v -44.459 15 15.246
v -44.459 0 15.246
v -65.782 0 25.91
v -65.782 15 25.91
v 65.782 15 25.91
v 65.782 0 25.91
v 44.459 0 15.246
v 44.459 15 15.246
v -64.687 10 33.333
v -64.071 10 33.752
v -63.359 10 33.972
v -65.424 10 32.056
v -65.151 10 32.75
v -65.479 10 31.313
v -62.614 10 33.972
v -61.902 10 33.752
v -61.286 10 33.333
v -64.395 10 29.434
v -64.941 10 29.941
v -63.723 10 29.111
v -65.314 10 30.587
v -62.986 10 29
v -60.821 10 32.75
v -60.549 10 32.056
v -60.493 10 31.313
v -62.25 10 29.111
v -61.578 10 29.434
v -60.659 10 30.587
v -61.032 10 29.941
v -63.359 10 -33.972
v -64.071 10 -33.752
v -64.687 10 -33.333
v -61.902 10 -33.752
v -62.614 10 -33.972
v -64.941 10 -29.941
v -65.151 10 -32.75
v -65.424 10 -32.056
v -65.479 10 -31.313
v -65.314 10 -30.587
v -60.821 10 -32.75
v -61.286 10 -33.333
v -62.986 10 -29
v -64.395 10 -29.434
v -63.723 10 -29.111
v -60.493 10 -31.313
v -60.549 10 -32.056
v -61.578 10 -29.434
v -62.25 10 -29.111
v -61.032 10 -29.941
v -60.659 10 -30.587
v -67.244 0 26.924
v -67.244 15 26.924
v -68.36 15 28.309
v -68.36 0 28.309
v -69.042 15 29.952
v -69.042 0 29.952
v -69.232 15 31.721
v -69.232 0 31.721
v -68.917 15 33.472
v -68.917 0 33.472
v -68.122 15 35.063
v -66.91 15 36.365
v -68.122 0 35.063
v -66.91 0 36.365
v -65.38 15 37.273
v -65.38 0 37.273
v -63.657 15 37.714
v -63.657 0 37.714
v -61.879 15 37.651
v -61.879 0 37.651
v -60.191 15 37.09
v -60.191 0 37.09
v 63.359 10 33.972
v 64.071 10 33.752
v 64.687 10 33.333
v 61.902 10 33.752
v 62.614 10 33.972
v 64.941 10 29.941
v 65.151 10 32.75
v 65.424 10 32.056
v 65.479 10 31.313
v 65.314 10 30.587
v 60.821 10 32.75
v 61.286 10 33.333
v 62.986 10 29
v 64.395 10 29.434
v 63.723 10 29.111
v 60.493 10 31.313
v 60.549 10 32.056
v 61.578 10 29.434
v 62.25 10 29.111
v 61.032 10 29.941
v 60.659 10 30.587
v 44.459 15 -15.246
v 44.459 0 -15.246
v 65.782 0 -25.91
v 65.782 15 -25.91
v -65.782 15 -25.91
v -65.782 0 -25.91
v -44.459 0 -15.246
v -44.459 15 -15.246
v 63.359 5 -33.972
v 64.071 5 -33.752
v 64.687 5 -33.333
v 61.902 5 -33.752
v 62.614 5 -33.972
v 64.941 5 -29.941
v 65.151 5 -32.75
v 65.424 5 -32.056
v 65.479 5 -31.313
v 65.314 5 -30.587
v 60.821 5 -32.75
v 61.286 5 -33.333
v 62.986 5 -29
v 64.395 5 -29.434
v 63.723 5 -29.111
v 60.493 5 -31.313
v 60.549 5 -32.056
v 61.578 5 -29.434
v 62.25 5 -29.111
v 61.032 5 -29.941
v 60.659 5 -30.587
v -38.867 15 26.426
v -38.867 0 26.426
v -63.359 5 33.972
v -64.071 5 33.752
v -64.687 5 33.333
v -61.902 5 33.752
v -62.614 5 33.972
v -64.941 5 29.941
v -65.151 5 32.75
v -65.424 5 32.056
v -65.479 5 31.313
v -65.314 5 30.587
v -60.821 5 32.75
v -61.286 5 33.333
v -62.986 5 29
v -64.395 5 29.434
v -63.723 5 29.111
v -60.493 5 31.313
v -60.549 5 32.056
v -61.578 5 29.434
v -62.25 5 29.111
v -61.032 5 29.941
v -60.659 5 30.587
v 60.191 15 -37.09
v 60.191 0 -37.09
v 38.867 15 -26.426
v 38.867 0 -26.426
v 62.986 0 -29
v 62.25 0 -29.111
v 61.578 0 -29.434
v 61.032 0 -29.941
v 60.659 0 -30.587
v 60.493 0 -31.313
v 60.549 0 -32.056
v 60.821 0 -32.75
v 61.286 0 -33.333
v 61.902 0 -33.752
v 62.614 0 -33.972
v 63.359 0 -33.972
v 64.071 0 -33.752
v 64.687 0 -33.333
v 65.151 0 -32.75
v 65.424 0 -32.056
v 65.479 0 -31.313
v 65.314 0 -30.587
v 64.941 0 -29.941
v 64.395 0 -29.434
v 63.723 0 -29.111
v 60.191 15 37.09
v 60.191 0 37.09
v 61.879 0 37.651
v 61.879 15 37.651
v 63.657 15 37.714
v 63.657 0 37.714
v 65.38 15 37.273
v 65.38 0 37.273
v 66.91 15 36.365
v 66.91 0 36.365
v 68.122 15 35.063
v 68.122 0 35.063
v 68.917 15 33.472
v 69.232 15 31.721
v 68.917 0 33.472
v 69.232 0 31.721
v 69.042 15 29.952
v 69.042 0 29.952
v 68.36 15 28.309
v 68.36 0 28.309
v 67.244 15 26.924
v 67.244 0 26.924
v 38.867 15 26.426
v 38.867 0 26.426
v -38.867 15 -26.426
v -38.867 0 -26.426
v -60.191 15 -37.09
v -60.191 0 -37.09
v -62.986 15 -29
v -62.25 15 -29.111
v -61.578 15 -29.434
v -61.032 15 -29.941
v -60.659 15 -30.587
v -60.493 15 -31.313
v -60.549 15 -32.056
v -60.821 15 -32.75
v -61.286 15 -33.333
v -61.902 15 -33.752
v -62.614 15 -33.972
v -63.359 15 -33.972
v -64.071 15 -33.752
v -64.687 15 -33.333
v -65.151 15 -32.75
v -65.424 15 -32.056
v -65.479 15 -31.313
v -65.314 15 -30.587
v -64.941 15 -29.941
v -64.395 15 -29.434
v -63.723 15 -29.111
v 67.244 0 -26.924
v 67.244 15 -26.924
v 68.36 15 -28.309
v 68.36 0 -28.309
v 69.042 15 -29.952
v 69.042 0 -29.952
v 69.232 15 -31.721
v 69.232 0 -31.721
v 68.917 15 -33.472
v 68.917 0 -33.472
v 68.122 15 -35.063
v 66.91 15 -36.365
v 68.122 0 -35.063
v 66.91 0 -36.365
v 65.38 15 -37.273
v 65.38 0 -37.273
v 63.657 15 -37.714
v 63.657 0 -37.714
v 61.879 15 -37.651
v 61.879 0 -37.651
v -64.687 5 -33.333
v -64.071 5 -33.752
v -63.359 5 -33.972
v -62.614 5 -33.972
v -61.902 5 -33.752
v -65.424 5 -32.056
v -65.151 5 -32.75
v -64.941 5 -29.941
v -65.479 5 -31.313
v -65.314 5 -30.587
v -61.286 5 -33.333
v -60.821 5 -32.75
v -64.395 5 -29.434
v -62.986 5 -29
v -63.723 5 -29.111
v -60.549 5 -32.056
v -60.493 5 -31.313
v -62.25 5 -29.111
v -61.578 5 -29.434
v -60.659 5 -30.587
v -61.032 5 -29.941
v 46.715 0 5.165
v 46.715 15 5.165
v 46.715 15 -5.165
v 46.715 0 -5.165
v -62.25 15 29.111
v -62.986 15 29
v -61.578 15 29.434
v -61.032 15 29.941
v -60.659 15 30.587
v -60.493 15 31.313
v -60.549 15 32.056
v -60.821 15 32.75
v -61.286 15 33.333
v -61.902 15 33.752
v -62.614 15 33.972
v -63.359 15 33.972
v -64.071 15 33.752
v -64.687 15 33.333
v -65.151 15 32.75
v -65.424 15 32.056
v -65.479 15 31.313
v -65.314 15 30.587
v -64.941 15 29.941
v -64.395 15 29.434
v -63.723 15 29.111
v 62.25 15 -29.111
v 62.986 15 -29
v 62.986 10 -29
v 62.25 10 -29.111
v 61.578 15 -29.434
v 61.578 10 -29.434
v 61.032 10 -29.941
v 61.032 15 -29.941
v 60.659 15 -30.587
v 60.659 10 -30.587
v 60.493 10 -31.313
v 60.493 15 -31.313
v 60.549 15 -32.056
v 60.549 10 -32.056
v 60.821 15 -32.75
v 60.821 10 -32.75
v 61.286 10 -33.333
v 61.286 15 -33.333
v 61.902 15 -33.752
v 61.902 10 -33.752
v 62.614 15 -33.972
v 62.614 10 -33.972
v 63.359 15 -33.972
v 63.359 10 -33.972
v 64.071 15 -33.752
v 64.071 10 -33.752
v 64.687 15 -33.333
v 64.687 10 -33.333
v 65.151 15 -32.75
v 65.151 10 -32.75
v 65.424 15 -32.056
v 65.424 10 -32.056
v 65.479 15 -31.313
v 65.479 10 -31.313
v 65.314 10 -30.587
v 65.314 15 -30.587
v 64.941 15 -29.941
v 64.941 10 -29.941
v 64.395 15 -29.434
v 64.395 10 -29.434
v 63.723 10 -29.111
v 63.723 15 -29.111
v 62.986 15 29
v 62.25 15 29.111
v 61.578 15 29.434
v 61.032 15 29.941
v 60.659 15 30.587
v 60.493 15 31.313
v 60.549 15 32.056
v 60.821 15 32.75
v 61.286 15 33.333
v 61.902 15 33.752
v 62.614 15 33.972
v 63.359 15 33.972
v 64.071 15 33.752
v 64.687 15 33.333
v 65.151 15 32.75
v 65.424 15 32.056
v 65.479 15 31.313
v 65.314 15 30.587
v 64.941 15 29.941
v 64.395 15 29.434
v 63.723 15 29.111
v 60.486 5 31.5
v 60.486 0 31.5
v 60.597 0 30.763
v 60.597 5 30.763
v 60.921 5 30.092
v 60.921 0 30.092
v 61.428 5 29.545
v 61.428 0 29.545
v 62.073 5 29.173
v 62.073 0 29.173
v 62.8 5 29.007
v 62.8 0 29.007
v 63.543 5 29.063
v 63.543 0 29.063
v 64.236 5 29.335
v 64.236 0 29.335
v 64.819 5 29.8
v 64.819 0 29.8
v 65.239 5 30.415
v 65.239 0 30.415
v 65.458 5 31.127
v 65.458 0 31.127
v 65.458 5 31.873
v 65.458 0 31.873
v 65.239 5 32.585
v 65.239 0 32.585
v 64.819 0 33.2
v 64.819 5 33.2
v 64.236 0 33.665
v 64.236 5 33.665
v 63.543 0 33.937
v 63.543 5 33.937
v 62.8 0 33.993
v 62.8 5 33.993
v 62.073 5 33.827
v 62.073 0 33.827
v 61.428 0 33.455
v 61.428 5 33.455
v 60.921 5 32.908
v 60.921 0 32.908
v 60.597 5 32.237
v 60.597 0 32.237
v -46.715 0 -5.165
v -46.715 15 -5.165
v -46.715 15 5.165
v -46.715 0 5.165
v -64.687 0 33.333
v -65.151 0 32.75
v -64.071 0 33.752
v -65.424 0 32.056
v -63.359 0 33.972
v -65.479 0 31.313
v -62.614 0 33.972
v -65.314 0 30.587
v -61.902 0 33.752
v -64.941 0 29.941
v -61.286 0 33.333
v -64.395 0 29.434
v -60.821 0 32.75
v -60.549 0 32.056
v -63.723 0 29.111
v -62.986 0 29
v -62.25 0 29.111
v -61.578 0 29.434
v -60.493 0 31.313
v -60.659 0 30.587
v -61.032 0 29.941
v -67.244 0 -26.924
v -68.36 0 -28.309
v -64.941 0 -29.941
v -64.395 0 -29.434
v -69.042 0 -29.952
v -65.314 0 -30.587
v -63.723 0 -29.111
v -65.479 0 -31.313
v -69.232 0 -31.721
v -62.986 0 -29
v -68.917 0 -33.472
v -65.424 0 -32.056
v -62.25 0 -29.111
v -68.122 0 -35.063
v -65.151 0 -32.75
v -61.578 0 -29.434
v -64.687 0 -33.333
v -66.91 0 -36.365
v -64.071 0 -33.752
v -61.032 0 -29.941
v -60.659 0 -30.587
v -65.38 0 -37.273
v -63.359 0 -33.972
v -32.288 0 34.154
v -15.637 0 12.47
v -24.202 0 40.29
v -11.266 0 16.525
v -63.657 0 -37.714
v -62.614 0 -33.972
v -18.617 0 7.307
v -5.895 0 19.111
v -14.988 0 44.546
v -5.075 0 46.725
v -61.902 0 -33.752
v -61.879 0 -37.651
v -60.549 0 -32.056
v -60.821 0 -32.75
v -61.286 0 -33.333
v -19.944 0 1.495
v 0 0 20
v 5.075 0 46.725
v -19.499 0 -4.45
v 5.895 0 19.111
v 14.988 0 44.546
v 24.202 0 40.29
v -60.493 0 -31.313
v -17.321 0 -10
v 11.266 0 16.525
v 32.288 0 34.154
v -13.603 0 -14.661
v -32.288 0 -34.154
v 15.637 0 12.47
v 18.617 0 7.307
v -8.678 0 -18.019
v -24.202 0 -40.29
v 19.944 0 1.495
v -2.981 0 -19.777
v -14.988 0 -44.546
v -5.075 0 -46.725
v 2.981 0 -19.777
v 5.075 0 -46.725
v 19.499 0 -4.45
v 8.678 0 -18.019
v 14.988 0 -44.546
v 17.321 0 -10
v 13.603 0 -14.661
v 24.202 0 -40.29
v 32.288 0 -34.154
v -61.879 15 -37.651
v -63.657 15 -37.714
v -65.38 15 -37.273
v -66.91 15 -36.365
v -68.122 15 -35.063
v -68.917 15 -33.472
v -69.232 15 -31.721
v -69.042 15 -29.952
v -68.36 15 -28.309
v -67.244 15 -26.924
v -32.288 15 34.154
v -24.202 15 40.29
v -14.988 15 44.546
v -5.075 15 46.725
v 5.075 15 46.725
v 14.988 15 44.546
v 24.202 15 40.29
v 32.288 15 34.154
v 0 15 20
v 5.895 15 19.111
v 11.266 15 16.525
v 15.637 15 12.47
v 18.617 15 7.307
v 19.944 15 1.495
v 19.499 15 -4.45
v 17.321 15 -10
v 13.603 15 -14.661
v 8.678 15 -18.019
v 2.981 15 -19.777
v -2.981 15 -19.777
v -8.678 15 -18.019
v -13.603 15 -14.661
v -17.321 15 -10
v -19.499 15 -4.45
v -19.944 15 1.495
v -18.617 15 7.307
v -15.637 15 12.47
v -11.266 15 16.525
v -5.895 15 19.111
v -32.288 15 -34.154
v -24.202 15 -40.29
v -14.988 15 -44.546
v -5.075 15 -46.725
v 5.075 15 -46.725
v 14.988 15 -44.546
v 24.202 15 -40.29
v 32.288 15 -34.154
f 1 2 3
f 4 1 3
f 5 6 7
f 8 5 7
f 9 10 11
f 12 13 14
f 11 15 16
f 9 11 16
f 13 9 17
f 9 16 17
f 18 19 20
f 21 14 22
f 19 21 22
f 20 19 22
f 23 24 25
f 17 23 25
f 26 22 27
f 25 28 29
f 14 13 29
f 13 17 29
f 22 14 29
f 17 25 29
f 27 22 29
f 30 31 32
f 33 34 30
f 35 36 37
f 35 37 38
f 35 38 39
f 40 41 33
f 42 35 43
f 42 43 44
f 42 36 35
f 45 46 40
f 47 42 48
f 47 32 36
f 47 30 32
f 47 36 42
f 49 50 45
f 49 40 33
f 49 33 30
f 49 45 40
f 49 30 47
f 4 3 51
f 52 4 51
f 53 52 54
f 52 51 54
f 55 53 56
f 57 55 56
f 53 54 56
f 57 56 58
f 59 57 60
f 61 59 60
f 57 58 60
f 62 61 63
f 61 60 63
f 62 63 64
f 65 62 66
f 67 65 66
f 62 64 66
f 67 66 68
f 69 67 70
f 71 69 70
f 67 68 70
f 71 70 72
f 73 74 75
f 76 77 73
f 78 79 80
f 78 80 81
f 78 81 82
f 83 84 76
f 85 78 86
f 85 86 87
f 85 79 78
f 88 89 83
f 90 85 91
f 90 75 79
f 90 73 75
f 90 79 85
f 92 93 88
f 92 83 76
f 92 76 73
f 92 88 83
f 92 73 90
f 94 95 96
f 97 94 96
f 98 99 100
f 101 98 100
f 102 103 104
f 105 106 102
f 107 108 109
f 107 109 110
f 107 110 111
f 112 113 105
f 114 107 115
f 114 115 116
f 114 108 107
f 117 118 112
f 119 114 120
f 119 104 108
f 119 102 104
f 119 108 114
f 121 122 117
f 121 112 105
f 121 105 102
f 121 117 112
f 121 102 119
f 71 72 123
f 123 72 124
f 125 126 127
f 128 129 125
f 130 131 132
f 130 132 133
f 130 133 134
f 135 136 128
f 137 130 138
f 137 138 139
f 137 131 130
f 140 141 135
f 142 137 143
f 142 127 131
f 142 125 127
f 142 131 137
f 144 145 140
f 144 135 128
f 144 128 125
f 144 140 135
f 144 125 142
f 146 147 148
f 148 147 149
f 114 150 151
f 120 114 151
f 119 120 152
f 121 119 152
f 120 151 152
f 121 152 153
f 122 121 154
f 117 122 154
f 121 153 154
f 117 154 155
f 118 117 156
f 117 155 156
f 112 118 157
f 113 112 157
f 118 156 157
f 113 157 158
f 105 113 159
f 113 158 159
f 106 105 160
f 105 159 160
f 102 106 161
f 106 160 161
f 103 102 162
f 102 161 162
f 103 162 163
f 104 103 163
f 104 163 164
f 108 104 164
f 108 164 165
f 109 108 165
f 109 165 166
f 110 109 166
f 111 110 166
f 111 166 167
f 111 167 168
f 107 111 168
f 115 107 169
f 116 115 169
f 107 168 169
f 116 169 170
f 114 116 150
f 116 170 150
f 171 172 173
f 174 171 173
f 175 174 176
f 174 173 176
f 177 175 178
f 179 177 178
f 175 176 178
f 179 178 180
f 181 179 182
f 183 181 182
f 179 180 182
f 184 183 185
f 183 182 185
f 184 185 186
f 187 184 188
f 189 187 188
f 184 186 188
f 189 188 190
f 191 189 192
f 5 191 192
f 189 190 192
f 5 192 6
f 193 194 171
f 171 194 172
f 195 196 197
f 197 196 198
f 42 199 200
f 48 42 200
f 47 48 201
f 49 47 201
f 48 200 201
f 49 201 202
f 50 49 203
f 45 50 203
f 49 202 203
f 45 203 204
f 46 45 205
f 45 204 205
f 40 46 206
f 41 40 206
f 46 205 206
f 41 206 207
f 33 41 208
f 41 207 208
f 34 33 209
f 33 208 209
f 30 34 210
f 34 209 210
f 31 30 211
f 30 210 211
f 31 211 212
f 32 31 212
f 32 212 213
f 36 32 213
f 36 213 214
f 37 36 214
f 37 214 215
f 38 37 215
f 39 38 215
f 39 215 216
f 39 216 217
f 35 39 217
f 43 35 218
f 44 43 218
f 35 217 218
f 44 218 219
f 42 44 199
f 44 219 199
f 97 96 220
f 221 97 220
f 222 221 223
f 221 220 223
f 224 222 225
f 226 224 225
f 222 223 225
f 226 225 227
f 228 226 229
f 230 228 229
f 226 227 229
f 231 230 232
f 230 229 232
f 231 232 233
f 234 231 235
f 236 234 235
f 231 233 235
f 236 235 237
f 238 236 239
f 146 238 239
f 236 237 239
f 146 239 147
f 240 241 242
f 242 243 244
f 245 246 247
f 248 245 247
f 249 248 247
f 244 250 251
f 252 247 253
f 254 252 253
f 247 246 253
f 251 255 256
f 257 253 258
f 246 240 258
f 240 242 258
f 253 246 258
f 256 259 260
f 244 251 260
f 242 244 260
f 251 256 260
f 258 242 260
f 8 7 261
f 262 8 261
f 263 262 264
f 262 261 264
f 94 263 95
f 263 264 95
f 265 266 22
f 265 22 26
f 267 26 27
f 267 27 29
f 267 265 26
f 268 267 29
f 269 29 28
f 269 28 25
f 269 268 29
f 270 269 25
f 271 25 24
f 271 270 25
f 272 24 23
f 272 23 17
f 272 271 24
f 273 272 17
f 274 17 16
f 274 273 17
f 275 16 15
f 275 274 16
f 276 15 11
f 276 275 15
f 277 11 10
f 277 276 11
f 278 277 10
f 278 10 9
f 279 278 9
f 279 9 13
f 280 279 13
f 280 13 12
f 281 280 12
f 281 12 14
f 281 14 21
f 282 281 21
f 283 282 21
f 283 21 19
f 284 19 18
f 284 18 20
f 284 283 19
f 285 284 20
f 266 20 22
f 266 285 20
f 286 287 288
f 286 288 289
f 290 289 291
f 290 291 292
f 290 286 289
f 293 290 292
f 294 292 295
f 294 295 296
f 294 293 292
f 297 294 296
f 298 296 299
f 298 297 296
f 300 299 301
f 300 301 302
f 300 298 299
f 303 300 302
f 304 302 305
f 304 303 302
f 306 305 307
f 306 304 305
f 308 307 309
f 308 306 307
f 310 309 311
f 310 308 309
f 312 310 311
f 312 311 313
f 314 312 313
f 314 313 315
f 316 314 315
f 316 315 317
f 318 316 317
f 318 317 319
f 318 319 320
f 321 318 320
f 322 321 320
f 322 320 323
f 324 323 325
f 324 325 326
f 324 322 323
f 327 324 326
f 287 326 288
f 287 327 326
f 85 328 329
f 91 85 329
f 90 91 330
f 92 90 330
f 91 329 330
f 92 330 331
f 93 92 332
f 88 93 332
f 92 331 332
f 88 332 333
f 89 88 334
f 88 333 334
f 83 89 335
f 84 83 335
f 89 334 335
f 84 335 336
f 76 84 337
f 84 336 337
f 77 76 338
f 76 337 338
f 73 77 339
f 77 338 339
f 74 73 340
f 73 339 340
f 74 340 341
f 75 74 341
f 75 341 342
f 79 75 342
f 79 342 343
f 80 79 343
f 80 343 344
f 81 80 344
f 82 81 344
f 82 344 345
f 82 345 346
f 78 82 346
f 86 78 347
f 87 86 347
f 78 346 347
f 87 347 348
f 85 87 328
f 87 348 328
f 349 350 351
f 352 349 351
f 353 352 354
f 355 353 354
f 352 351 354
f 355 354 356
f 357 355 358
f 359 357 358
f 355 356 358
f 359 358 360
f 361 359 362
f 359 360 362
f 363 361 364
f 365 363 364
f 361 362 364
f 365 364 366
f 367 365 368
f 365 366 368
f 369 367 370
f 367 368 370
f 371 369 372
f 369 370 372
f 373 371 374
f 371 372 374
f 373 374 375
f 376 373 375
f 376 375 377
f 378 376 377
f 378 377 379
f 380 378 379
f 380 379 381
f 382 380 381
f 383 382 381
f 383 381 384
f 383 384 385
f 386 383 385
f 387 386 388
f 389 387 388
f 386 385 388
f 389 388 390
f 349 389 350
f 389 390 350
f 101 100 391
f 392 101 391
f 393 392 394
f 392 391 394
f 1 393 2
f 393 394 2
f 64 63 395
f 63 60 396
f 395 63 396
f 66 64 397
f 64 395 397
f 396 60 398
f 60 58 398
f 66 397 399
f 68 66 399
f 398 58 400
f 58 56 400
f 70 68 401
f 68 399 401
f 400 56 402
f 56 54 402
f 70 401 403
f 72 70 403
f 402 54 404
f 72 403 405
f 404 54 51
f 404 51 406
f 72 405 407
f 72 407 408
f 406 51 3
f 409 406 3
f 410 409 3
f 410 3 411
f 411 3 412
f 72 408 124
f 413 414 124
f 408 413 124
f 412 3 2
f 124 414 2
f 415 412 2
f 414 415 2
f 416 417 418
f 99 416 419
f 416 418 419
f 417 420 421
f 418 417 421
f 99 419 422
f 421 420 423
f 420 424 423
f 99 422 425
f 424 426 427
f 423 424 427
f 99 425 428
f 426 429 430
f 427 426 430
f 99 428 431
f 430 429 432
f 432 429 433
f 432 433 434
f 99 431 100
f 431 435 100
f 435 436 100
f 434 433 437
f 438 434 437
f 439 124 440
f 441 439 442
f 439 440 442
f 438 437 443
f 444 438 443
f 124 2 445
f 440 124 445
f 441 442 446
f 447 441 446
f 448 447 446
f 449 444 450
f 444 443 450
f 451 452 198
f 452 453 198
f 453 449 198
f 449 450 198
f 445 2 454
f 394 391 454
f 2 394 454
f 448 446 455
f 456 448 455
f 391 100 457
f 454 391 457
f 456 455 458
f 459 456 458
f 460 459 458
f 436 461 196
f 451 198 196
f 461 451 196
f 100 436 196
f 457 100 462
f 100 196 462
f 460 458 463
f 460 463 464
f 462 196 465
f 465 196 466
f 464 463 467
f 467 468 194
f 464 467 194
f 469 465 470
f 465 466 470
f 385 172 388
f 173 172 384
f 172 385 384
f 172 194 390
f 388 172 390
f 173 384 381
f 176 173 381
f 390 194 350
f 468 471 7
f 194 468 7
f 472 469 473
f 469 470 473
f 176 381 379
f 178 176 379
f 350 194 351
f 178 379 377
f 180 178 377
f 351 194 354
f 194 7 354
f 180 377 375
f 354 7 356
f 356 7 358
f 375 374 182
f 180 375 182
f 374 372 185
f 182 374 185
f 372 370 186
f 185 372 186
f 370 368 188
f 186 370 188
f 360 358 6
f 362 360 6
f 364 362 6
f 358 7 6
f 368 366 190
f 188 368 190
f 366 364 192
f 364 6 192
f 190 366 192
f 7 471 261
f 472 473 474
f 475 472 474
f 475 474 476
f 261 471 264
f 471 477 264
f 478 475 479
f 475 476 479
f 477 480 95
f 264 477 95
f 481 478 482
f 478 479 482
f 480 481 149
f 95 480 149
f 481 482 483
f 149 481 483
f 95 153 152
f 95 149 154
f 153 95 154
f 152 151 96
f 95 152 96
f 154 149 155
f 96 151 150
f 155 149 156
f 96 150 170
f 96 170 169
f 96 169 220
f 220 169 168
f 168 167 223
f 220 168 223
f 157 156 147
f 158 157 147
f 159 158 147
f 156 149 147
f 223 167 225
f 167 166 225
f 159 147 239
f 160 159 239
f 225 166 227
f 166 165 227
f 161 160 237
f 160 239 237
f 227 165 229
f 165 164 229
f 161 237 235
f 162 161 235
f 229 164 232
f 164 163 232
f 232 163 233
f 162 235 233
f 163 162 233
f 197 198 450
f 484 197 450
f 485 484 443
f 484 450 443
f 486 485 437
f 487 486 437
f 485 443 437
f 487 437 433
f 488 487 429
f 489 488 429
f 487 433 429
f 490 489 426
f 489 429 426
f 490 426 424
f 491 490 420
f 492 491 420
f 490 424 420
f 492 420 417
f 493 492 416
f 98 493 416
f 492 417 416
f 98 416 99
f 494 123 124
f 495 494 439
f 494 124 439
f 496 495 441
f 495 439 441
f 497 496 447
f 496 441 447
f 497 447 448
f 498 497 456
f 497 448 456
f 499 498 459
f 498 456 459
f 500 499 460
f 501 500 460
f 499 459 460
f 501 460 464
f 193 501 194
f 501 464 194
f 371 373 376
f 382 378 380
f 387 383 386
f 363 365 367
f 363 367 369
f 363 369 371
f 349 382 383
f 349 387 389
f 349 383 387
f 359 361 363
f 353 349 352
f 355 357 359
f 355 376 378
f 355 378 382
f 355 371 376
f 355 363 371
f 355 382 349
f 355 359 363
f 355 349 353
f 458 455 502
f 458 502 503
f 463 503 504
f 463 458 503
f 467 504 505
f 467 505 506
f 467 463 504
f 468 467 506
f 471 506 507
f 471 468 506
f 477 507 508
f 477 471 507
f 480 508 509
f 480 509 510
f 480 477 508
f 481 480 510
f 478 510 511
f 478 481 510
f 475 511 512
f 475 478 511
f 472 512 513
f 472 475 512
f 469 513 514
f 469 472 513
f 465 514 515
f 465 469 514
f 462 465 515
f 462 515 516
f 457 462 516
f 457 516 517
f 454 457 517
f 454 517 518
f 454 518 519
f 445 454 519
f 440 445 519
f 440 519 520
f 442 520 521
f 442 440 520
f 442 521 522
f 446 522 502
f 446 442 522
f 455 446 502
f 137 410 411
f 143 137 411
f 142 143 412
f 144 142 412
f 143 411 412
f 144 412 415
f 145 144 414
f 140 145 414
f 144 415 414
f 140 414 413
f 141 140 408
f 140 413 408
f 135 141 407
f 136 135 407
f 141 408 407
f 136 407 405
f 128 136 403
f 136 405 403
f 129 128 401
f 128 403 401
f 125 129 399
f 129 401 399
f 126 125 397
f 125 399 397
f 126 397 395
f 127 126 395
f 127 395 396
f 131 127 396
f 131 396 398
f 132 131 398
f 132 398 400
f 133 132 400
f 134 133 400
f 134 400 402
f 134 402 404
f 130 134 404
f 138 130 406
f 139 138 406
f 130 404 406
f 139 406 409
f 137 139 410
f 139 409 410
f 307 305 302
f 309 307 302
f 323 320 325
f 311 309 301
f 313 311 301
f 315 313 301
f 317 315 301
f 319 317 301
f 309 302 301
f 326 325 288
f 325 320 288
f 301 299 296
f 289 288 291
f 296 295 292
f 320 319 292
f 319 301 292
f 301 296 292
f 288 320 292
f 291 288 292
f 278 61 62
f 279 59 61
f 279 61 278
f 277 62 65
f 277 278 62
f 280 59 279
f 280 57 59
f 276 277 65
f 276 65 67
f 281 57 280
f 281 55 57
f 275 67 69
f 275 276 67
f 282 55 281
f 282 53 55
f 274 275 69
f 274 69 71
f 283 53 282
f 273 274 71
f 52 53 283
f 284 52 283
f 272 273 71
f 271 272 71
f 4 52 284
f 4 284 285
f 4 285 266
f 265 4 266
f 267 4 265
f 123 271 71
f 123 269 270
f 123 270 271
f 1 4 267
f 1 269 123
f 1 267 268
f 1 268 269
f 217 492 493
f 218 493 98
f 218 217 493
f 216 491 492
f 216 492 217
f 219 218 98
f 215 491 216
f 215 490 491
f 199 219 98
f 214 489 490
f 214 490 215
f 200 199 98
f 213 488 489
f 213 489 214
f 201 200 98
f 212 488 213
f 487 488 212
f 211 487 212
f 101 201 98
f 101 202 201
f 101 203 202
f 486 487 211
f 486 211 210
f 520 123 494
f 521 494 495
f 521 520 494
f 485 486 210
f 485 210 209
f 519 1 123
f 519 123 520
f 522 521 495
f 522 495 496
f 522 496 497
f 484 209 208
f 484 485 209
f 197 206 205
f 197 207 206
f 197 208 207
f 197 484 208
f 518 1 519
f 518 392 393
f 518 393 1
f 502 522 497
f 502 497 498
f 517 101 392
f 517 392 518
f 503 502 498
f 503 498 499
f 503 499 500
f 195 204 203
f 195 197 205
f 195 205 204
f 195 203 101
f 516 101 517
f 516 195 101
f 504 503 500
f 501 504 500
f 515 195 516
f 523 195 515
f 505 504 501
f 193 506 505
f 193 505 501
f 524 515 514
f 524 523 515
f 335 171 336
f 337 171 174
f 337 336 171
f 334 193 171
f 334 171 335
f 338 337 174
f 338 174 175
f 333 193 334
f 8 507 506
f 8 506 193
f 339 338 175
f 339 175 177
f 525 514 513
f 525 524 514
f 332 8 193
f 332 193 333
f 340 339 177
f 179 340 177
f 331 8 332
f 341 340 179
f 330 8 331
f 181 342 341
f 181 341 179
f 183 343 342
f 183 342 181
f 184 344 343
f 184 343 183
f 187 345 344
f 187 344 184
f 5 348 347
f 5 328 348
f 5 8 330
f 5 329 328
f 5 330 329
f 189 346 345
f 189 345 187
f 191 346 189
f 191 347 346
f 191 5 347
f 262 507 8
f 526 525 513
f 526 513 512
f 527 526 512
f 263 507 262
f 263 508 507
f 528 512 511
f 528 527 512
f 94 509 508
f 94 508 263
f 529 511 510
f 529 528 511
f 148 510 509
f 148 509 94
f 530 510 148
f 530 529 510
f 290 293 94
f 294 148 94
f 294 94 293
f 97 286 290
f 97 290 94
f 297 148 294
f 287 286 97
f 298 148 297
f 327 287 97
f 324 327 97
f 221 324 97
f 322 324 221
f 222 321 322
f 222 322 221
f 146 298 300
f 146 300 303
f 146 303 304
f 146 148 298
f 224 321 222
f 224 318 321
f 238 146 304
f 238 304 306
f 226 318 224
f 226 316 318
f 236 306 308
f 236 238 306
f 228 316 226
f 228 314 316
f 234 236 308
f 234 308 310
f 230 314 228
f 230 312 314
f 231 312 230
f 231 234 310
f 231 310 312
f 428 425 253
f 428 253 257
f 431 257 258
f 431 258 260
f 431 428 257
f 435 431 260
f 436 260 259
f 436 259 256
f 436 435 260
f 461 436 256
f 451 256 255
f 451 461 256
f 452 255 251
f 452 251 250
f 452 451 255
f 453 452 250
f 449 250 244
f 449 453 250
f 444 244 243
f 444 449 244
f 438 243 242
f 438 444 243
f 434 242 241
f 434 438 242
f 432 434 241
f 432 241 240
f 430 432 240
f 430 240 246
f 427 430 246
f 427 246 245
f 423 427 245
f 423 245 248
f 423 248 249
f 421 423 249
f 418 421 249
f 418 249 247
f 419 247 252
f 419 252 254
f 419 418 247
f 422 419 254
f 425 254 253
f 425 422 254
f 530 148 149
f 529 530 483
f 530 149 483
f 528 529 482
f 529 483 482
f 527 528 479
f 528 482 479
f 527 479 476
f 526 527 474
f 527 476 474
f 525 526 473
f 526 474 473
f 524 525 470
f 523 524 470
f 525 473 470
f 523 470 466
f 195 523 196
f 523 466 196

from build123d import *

# Parameters (mm, degrees)
SKETCH_1_R               = 20
EXTRUDE_1_DEPTH          = 15
SKETCH_2_R               = 2.5
CUT_EXTRUDE_1_DEPTH      = 5
MIRROR_2_COPY_1_SKETCH_R = 2.5
MIRROR_2_COPY_1_DEPTH    = 5
MIRROR_3_COPY_1_SKETCH_R = 2.5
MIRROR_3_COPY_1_DEPTH    = 5
MIRROR_3_COPY_2_SKETCH_R = 2.5
MIRROR_3_COPY_2_DEPTH    = 5
MIRROR_3_COPY_3_SKETCH_R = 2.5
MIRROR_3_COPY_3_DEPTH    = 5


with BuildPart() as part:
    # 草图1 → 凸台-拉伸1 (new body)
    with BuildSketch(Plane(origin=(0, 0, 0), x_dir=(1, 0, 0), z_dir=(0, 1, 0))):
        with BuildLine():
            Line((44.458501576, 15.246036783), (65.781966365, 25.910071498))
            ThreePointArc((65.781966365, 25.910071498), (68.576327064, 34.295567803), (60.190830759, 37.089928502))
            Line((60.190830759, 37.089928502), (38.867365971, 26.425893787))
            ThreePointArc((38.867365971, 26.425893787), (0, 47), (-38.867365971, 26.425893787))
            Line((-38.867365971, 26.425893787), (-60.190830759, 37.089928502))
            ThreePointArc((-60.190830759, 37.089928502), (-68.576327064, 34.295567803), (-65.781966365, 25.910071498))
            Line((-65.781966365, 25.910071498), (-44.458501576, 15.246036783))
            ThreePointArc((-44.458501576, 15.246036783), (-47, 0), (-44.458501576, -15.246036783))
            Line((-44.458501576, -15.246036783), (-65.781966365, -25.910071498))
            ThreePointArc((-65.781966365, -25.910071498), (-68.576327064, -34.295567803), (-60.190830759, -37.089928502))
            Line((-60.190830759, -37.089928502), (-38.867365971, -26.425893787))
            ThreePointArc((-38.867365971, -26.425893787), (0, -47), (38.867365971, -26.425893787))
            Line((38.867365971, -26.425893787), (60.190830759, -37.089928502))
            ThreePointArc((60.190830759, -37.089928502), (68.576327064, -34.295567803), (65.781966365, -25.910071498))
            Line((65.781966365, -25.910071498), (44.458501576, -15.246036783))
            ThreePointArc((44.458501576, -15.246036783), (47, 0), (44.458501576, 15.246036783))
        make_face()
        with Locations(Location((0, 0, 0), (0, 0, 270))):
            Circle(SKETCH_1_R, mode=Mode.SUBTRACT)
    extrude(amount=EXTRUDE_1_DEPTH)

    # 草图2 → 切除-拉伸1 (cut)
    with BuildSketch(Plane(origin=(0, 15, 0), x_dir=(1, 0, 0), z_dir=(0, 1, 0))):
        with Locations(Location((-62.986398562, 31.5, 0), (0, 0, 270))):
            Circle(SKETCH_2_R)
    cut_extrude_1 = extrude(amount=-CUT_EXTRUDE_1_DEPTH, mode=Mode.SUBTRACT)

    # 镜向1: 切除-拉伸1 across plane
    add(cut_extrude_1.mirror(Plane.XY), mode=Mode.SUBTRACT)

    # 镜向2: 切除-拉伸1 across plane
    add(cut_extrude_1.mirror(Plane(origin=(0, 0, 0), x_dir=(0, 0, 1), z_dir=(1, 0, 0))), mode=Mode.SUBTRACT)

    # 镜向2 copy 1 sketch → 镜向2 copy 1 (cut)
    with BuildSketch(Plane(origin=(0, 15, 0), x_dir=(-1, 0, 0), z_dir=(0, 1, 0))):
        with Locations(Location((-62.986398562, 31.5, 0), (0, 0, 270))):
            Circle(MIRROR_2_COPY_1_SKETCH_R)
    extrude(amount=-MIRROR_2_COPY_1_DEPTH, mode=Mode.SUBTRACT)

    # 镜向3: 切除-拉伸1 across plane
    add(cut_extrude_1.mirror(Plane(origin=(0, 7.5, 0), x_dir=(0, 0, 1), z_dir=(0, -1, 0))), mode=Mode.SUBTRACT)

    # 镜向3 copy 1 sketch → 镜向3 copy 1 (cut)
    with BuildSketch(Plane.XZ):
        with Locations(Location((-62.986398562, 31.5, 0), (0, 0, 270))):
            Circle(MIRROR_3_COPY_1_SKETCH_R)
    extrude(amount=-MIRROR_3_COPY_1_DEPTH, mode=Mode.SUBTRACT)

    # 镜向3 copy 2 sketch → 镜向3 copy 2 (cut)
    with BuildSketch(Plane(origin=(0, 0, 0), x_dir=(-1, 0, 0), z_dir=(0, -1, 0))):
        with Locations(Location((-62.986398562, 31.5, 0), (0, 0, 270))):
            Circle(MIRROR_3_COPY_2_SKETCH_R)
    extrude(amount=-MIRROR_3_COPY_2_DEPTH, mode=Mode.SUBTRACT)

    # 镜向3 copy 3 sketch → 镜向3 copy 3 (cut)
    with BuildSketch(Plane(origin=(0, 0, 0), x_dir=(-1, 0, 0), z_dir=(0, -1, 0))):
        with Locations((-62.986398562, -31.5)):
            Circle(MIRROR_3_COPY_3_SKETCH_R)
    extrude(amount=-MIRROR_3_COPY_3_DEPTH, mode=Mode.SUBTRACT)


solid = part.part
